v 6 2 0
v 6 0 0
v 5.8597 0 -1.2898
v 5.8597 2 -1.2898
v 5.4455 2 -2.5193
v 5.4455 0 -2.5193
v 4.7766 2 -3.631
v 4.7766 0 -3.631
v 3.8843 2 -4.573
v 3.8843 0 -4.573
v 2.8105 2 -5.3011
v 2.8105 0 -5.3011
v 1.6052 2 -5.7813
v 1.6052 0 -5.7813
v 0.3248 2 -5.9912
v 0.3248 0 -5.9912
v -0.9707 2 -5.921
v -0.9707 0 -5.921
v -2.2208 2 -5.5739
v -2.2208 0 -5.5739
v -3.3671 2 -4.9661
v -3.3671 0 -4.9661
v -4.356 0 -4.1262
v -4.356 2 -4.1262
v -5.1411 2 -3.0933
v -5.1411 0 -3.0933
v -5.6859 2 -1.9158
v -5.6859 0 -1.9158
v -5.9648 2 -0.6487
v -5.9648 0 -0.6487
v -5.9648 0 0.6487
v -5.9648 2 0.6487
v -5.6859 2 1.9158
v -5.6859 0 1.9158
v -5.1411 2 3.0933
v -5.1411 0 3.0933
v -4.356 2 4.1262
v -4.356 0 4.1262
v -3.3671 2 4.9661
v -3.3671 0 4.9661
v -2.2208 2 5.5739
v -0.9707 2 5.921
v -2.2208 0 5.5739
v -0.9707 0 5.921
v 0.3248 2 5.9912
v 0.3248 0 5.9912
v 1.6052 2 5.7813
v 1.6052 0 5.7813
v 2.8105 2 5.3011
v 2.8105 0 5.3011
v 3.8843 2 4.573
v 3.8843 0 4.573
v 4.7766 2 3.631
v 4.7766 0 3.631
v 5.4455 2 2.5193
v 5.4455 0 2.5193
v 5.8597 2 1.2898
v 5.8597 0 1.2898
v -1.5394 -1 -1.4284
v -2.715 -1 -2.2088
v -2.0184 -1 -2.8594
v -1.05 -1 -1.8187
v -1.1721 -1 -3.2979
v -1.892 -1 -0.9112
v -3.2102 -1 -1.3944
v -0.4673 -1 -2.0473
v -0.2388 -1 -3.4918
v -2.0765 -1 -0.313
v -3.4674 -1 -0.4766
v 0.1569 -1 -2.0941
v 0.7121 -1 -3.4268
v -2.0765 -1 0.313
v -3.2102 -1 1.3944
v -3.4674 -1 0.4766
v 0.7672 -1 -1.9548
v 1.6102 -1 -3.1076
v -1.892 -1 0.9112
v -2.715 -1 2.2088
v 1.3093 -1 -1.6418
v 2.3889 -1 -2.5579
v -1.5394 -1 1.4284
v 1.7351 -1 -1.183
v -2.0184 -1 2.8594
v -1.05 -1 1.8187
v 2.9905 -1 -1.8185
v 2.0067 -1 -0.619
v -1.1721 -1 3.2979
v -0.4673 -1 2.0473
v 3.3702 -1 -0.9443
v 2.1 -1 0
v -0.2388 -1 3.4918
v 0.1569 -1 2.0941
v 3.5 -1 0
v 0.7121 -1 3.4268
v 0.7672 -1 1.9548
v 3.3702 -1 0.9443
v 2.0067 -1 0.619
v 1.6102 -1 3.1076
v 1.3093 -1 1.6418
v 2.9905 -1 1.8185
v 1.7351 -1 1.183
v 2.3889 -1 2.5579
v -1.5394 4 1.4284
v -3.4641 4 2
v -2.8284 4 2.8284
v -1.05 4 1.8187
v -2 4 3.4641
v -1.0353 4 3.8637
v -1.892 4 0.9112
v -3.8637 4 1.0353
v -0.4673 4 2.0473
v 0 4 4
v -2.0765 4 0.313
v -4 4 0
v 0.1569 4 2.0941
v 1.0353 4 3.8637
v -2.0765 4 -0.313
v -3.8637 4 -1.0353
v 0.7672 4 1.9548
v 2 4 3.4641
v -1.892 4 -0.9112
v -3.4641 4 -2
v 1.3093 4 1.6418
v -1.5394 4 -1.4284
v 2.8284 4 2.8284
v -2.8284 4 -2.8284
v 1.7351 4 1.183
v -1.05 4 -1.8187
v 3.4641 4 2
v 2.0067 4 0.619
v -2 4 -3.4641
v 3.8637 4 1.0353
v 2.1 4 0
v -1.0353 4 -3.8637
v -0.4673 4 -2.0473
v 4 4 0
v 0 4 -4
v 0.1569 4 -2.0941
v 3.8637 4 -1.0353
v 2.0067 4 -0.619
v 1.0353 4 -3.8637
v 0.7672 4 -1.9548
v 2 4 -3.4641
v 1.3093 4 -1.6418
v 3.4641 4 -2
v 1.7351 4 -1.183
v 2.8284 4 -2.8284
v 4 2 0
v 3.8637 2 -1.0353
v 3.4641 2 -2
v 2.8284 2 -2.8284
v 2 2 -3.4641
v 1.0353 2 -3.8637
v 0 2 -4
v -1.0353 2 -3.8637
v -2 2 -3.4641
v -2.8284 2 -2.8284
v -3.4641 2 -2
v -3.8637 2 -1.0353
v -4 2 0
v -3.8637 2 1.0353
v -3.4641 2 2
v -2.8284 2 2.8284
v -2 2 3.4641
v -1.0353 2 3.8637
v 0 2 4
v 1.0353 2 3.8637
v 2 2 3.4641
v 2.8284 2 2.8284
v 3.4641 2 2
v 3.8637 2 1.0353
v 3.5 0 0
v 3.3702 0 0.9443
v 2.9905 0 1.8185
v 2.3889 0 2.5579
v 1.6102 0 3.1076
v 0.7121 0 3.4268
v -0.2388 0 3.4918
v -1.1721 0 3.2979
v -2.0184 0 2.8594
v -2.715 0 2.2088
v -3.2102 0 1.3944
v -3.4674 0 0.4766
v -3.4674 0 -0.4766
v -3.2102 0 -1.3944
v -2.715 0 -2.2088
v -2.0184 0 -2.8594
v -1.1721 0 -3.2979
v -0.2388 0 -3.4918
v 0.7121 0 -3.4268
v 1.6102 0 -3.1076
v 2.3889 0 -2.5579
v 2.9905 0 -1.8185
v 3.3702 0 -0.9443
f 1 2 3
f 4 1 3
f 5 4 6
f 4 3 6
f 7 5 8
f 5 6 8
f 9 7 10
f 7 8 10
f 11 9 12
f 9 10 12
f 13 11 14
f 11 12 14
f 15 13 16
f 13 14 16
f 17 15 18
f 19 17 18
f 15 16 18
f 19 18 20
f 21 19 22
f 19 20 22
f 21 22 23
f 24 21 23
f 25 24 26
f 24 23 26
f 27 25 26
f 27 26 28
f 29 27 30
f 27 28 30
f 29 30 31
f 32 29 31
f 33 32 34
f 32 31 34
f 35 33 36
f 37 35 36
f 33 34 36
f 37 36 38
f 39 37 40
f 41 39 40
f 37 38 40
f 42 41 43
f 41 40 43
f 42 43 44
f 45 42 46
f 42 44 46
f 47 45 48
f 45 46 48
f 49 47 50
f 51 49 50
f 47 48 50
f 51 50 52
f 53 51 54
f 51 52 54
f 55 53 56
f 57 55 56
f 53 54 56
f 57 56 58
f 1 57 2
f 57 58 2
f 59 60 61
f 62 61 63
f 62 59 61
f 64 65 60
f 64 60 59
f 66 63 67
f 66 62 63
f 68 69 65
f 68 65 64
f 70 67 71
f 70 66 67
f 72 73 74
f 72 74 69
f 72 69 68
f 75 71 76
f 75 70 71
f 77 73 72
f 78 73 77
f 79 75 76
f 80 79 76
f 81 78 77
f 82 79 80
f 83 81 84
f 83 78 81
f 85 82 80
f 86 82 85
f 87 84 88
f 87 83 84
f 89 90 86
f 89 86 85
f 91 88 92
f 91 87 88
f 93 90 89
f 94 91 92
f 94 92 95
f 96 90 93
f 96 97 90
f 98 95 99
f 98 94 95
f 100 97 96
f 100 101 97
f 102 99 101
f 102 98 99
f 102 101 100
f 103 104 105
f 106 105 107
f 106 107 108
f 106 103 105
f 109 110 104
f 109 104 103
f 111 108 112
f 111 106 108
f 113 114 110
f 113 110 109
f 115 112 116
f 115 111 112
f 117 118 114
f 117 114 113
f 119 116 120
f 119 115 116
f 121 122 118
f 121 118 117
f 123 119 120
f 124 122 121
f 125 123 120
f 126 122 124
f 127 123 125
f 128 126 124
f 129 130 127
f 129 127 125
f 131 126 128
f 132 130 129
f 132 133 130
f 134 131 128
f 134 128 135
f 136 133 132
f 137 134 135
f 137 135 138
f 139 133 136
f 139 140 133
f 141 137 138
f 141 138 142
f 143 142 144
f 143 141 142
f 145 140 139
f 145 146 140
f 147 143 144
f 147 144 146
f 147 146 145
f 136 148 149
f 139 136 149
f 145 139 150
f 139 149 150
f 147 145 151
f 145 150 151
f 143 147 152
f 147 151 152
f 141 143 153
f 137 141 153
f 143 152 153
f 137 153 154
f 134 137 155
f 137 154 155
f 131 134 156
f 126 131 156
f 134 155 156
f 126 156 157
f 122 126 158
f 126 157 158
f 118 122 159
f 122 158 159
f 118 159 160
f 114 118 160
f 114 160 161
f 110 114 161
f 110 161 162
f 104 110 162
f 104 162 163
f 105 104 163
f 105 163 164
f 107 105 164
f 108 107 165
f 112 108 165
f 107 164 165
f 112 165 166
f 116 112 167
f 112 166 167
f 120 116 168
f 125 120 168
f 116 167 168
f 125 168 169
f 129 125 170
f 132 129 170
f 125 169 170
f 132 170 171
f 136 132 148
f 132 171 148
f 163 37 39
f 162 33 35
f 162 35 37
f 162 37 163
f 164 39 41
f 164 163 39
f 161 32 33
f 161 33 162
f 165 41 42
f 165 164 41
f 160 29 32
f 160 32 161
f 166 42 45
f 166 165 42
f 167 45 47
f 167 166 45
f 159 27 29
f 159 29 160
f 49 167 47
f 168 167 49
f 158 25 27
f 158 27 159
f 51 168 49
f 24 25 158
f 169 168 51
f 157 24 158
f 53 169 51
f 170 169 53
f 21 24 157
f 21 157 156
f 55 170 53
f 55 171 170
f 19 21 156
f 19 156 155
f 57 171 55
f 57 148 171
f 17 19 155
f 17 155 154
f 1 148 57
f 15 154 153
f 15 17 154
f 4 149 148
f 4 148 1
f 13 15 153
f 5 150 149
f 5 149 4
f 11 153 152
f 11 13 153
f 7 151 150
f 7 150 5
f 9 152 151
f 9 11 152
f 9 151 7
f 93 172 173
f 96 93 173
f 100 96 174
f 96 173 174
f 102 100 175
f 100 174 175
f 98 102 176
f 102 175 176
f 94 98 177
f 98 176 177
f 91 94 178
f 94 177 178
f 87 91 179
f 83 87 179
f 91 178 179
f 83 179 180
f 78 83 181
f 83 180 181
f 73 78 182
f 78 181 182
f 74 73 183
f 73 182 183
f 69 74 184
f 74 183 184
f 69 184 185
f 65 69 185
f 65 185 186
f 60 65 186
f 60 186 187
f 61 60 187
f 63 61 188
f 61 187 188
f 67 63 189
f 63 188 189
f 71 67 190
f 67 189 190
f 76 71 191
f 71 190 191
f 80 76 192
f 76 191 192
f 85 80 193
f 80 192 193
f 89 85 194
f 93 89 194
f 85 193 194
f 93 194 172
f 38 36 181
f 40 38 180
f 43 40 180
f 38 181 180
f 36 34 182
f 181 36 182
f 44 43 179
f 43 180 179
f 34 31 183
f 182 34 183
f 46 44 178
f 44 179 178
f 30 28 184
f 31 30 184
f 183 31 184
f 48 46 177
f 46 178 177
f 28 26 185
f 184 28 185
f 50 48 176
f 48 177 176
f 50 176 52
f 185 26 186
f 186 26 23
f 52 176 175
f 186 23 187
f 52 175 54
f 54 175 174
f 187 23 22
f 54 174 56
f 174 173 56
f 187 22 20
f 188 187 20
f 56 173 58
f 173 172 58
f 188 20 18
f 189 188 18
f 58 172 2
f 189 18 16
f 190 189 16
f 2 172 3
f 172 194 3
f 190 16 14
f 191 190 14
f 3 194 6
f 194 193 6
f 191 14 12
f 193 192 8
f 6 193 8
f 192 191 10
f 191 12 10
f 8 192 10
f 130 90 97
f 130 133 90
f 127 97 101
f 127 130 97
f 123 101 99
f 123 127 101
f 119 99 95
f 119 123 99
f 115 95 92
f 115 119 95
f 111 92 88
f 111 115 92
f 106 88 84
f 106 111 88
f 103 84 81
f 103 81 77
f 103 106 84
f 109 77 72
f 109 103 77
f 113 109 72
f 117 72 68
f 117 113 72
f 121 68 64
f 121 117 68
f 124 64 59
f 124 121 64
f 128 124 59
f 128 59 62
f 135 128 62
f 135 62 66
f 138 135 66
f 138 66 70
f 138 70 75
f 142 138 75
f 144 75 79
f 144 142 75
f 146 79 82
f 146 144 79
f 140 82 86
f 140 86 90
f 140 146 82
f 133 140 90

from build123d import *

# Parameters (mm, degrees)
SKETCH1_R               = 6
BOSS_EXTRUDE1_DEPTH     = 2
SKETCH2_R               = 4
BOSS_EXTRUDE2_DEPTH     = 2
SKETCH3_R               = 2.1
CUT_EXTRUDE1_DEPTH      = 1
CUT_EXTRUDE1_DEPTH_BACK = 5
SKETCH4_R               = 3.5
SKETCH4_R_2             = 2.1
BOSS_EXTRUDE3_DEPTH     = 1


with BuildPart() as part:
    # Sketch1 → Boss-Extrude1 (new body)
    with BuildSketch(Plane(origin=(0, 0, 0), x_dir=(1, 0, 0), z_dir=(0, 1, 0))):
        Circle(SKETCH1_R)
    extrude(amount=BOSS_EXTRUDE1_DEPTH)

    # Sketch2 → Boss-Extrude2 (add)
    with BuildSketch(Plane(origin=(0, 2, 0), x_dir=(1, 0, 0), z_dir=(0, 1, 0))):
        Circle(SKETCH2_R)
    extrude(amount=BOSS_EXTRUDE2_DEPTH)

    # Sketch3 → Cut-Extrude1 (cut, two sides)
    with BuildSketch(Plane(origin=(0, 4, 0), x_dir=(1, 0, 0), z_dir=(0, 1, 0))) as cut_extrude1_sk:
        Circle(SKETCH3_R)
    extrude(amount=CUT_EXTRUDE1_DEPTH, mode=Mode.SUBTRACT)
    extrude(cut_extrude1_sk.sketch, amount=-CUT_EXTRUDE1_DEPTH_BACK, mode=Mode.SUBTRACT)

    # Sketch4 → Boss-Extrude3 (add)
    with BuildSketch(Plane.XZ):
        Circle(SKETCH4_R)
        Circle(SKETCH4_R_2, mode=Mode.SUBTRACT)
    extrude(amount=BOSS_EXTRUDE3_DEPTH)


solid = part.part
